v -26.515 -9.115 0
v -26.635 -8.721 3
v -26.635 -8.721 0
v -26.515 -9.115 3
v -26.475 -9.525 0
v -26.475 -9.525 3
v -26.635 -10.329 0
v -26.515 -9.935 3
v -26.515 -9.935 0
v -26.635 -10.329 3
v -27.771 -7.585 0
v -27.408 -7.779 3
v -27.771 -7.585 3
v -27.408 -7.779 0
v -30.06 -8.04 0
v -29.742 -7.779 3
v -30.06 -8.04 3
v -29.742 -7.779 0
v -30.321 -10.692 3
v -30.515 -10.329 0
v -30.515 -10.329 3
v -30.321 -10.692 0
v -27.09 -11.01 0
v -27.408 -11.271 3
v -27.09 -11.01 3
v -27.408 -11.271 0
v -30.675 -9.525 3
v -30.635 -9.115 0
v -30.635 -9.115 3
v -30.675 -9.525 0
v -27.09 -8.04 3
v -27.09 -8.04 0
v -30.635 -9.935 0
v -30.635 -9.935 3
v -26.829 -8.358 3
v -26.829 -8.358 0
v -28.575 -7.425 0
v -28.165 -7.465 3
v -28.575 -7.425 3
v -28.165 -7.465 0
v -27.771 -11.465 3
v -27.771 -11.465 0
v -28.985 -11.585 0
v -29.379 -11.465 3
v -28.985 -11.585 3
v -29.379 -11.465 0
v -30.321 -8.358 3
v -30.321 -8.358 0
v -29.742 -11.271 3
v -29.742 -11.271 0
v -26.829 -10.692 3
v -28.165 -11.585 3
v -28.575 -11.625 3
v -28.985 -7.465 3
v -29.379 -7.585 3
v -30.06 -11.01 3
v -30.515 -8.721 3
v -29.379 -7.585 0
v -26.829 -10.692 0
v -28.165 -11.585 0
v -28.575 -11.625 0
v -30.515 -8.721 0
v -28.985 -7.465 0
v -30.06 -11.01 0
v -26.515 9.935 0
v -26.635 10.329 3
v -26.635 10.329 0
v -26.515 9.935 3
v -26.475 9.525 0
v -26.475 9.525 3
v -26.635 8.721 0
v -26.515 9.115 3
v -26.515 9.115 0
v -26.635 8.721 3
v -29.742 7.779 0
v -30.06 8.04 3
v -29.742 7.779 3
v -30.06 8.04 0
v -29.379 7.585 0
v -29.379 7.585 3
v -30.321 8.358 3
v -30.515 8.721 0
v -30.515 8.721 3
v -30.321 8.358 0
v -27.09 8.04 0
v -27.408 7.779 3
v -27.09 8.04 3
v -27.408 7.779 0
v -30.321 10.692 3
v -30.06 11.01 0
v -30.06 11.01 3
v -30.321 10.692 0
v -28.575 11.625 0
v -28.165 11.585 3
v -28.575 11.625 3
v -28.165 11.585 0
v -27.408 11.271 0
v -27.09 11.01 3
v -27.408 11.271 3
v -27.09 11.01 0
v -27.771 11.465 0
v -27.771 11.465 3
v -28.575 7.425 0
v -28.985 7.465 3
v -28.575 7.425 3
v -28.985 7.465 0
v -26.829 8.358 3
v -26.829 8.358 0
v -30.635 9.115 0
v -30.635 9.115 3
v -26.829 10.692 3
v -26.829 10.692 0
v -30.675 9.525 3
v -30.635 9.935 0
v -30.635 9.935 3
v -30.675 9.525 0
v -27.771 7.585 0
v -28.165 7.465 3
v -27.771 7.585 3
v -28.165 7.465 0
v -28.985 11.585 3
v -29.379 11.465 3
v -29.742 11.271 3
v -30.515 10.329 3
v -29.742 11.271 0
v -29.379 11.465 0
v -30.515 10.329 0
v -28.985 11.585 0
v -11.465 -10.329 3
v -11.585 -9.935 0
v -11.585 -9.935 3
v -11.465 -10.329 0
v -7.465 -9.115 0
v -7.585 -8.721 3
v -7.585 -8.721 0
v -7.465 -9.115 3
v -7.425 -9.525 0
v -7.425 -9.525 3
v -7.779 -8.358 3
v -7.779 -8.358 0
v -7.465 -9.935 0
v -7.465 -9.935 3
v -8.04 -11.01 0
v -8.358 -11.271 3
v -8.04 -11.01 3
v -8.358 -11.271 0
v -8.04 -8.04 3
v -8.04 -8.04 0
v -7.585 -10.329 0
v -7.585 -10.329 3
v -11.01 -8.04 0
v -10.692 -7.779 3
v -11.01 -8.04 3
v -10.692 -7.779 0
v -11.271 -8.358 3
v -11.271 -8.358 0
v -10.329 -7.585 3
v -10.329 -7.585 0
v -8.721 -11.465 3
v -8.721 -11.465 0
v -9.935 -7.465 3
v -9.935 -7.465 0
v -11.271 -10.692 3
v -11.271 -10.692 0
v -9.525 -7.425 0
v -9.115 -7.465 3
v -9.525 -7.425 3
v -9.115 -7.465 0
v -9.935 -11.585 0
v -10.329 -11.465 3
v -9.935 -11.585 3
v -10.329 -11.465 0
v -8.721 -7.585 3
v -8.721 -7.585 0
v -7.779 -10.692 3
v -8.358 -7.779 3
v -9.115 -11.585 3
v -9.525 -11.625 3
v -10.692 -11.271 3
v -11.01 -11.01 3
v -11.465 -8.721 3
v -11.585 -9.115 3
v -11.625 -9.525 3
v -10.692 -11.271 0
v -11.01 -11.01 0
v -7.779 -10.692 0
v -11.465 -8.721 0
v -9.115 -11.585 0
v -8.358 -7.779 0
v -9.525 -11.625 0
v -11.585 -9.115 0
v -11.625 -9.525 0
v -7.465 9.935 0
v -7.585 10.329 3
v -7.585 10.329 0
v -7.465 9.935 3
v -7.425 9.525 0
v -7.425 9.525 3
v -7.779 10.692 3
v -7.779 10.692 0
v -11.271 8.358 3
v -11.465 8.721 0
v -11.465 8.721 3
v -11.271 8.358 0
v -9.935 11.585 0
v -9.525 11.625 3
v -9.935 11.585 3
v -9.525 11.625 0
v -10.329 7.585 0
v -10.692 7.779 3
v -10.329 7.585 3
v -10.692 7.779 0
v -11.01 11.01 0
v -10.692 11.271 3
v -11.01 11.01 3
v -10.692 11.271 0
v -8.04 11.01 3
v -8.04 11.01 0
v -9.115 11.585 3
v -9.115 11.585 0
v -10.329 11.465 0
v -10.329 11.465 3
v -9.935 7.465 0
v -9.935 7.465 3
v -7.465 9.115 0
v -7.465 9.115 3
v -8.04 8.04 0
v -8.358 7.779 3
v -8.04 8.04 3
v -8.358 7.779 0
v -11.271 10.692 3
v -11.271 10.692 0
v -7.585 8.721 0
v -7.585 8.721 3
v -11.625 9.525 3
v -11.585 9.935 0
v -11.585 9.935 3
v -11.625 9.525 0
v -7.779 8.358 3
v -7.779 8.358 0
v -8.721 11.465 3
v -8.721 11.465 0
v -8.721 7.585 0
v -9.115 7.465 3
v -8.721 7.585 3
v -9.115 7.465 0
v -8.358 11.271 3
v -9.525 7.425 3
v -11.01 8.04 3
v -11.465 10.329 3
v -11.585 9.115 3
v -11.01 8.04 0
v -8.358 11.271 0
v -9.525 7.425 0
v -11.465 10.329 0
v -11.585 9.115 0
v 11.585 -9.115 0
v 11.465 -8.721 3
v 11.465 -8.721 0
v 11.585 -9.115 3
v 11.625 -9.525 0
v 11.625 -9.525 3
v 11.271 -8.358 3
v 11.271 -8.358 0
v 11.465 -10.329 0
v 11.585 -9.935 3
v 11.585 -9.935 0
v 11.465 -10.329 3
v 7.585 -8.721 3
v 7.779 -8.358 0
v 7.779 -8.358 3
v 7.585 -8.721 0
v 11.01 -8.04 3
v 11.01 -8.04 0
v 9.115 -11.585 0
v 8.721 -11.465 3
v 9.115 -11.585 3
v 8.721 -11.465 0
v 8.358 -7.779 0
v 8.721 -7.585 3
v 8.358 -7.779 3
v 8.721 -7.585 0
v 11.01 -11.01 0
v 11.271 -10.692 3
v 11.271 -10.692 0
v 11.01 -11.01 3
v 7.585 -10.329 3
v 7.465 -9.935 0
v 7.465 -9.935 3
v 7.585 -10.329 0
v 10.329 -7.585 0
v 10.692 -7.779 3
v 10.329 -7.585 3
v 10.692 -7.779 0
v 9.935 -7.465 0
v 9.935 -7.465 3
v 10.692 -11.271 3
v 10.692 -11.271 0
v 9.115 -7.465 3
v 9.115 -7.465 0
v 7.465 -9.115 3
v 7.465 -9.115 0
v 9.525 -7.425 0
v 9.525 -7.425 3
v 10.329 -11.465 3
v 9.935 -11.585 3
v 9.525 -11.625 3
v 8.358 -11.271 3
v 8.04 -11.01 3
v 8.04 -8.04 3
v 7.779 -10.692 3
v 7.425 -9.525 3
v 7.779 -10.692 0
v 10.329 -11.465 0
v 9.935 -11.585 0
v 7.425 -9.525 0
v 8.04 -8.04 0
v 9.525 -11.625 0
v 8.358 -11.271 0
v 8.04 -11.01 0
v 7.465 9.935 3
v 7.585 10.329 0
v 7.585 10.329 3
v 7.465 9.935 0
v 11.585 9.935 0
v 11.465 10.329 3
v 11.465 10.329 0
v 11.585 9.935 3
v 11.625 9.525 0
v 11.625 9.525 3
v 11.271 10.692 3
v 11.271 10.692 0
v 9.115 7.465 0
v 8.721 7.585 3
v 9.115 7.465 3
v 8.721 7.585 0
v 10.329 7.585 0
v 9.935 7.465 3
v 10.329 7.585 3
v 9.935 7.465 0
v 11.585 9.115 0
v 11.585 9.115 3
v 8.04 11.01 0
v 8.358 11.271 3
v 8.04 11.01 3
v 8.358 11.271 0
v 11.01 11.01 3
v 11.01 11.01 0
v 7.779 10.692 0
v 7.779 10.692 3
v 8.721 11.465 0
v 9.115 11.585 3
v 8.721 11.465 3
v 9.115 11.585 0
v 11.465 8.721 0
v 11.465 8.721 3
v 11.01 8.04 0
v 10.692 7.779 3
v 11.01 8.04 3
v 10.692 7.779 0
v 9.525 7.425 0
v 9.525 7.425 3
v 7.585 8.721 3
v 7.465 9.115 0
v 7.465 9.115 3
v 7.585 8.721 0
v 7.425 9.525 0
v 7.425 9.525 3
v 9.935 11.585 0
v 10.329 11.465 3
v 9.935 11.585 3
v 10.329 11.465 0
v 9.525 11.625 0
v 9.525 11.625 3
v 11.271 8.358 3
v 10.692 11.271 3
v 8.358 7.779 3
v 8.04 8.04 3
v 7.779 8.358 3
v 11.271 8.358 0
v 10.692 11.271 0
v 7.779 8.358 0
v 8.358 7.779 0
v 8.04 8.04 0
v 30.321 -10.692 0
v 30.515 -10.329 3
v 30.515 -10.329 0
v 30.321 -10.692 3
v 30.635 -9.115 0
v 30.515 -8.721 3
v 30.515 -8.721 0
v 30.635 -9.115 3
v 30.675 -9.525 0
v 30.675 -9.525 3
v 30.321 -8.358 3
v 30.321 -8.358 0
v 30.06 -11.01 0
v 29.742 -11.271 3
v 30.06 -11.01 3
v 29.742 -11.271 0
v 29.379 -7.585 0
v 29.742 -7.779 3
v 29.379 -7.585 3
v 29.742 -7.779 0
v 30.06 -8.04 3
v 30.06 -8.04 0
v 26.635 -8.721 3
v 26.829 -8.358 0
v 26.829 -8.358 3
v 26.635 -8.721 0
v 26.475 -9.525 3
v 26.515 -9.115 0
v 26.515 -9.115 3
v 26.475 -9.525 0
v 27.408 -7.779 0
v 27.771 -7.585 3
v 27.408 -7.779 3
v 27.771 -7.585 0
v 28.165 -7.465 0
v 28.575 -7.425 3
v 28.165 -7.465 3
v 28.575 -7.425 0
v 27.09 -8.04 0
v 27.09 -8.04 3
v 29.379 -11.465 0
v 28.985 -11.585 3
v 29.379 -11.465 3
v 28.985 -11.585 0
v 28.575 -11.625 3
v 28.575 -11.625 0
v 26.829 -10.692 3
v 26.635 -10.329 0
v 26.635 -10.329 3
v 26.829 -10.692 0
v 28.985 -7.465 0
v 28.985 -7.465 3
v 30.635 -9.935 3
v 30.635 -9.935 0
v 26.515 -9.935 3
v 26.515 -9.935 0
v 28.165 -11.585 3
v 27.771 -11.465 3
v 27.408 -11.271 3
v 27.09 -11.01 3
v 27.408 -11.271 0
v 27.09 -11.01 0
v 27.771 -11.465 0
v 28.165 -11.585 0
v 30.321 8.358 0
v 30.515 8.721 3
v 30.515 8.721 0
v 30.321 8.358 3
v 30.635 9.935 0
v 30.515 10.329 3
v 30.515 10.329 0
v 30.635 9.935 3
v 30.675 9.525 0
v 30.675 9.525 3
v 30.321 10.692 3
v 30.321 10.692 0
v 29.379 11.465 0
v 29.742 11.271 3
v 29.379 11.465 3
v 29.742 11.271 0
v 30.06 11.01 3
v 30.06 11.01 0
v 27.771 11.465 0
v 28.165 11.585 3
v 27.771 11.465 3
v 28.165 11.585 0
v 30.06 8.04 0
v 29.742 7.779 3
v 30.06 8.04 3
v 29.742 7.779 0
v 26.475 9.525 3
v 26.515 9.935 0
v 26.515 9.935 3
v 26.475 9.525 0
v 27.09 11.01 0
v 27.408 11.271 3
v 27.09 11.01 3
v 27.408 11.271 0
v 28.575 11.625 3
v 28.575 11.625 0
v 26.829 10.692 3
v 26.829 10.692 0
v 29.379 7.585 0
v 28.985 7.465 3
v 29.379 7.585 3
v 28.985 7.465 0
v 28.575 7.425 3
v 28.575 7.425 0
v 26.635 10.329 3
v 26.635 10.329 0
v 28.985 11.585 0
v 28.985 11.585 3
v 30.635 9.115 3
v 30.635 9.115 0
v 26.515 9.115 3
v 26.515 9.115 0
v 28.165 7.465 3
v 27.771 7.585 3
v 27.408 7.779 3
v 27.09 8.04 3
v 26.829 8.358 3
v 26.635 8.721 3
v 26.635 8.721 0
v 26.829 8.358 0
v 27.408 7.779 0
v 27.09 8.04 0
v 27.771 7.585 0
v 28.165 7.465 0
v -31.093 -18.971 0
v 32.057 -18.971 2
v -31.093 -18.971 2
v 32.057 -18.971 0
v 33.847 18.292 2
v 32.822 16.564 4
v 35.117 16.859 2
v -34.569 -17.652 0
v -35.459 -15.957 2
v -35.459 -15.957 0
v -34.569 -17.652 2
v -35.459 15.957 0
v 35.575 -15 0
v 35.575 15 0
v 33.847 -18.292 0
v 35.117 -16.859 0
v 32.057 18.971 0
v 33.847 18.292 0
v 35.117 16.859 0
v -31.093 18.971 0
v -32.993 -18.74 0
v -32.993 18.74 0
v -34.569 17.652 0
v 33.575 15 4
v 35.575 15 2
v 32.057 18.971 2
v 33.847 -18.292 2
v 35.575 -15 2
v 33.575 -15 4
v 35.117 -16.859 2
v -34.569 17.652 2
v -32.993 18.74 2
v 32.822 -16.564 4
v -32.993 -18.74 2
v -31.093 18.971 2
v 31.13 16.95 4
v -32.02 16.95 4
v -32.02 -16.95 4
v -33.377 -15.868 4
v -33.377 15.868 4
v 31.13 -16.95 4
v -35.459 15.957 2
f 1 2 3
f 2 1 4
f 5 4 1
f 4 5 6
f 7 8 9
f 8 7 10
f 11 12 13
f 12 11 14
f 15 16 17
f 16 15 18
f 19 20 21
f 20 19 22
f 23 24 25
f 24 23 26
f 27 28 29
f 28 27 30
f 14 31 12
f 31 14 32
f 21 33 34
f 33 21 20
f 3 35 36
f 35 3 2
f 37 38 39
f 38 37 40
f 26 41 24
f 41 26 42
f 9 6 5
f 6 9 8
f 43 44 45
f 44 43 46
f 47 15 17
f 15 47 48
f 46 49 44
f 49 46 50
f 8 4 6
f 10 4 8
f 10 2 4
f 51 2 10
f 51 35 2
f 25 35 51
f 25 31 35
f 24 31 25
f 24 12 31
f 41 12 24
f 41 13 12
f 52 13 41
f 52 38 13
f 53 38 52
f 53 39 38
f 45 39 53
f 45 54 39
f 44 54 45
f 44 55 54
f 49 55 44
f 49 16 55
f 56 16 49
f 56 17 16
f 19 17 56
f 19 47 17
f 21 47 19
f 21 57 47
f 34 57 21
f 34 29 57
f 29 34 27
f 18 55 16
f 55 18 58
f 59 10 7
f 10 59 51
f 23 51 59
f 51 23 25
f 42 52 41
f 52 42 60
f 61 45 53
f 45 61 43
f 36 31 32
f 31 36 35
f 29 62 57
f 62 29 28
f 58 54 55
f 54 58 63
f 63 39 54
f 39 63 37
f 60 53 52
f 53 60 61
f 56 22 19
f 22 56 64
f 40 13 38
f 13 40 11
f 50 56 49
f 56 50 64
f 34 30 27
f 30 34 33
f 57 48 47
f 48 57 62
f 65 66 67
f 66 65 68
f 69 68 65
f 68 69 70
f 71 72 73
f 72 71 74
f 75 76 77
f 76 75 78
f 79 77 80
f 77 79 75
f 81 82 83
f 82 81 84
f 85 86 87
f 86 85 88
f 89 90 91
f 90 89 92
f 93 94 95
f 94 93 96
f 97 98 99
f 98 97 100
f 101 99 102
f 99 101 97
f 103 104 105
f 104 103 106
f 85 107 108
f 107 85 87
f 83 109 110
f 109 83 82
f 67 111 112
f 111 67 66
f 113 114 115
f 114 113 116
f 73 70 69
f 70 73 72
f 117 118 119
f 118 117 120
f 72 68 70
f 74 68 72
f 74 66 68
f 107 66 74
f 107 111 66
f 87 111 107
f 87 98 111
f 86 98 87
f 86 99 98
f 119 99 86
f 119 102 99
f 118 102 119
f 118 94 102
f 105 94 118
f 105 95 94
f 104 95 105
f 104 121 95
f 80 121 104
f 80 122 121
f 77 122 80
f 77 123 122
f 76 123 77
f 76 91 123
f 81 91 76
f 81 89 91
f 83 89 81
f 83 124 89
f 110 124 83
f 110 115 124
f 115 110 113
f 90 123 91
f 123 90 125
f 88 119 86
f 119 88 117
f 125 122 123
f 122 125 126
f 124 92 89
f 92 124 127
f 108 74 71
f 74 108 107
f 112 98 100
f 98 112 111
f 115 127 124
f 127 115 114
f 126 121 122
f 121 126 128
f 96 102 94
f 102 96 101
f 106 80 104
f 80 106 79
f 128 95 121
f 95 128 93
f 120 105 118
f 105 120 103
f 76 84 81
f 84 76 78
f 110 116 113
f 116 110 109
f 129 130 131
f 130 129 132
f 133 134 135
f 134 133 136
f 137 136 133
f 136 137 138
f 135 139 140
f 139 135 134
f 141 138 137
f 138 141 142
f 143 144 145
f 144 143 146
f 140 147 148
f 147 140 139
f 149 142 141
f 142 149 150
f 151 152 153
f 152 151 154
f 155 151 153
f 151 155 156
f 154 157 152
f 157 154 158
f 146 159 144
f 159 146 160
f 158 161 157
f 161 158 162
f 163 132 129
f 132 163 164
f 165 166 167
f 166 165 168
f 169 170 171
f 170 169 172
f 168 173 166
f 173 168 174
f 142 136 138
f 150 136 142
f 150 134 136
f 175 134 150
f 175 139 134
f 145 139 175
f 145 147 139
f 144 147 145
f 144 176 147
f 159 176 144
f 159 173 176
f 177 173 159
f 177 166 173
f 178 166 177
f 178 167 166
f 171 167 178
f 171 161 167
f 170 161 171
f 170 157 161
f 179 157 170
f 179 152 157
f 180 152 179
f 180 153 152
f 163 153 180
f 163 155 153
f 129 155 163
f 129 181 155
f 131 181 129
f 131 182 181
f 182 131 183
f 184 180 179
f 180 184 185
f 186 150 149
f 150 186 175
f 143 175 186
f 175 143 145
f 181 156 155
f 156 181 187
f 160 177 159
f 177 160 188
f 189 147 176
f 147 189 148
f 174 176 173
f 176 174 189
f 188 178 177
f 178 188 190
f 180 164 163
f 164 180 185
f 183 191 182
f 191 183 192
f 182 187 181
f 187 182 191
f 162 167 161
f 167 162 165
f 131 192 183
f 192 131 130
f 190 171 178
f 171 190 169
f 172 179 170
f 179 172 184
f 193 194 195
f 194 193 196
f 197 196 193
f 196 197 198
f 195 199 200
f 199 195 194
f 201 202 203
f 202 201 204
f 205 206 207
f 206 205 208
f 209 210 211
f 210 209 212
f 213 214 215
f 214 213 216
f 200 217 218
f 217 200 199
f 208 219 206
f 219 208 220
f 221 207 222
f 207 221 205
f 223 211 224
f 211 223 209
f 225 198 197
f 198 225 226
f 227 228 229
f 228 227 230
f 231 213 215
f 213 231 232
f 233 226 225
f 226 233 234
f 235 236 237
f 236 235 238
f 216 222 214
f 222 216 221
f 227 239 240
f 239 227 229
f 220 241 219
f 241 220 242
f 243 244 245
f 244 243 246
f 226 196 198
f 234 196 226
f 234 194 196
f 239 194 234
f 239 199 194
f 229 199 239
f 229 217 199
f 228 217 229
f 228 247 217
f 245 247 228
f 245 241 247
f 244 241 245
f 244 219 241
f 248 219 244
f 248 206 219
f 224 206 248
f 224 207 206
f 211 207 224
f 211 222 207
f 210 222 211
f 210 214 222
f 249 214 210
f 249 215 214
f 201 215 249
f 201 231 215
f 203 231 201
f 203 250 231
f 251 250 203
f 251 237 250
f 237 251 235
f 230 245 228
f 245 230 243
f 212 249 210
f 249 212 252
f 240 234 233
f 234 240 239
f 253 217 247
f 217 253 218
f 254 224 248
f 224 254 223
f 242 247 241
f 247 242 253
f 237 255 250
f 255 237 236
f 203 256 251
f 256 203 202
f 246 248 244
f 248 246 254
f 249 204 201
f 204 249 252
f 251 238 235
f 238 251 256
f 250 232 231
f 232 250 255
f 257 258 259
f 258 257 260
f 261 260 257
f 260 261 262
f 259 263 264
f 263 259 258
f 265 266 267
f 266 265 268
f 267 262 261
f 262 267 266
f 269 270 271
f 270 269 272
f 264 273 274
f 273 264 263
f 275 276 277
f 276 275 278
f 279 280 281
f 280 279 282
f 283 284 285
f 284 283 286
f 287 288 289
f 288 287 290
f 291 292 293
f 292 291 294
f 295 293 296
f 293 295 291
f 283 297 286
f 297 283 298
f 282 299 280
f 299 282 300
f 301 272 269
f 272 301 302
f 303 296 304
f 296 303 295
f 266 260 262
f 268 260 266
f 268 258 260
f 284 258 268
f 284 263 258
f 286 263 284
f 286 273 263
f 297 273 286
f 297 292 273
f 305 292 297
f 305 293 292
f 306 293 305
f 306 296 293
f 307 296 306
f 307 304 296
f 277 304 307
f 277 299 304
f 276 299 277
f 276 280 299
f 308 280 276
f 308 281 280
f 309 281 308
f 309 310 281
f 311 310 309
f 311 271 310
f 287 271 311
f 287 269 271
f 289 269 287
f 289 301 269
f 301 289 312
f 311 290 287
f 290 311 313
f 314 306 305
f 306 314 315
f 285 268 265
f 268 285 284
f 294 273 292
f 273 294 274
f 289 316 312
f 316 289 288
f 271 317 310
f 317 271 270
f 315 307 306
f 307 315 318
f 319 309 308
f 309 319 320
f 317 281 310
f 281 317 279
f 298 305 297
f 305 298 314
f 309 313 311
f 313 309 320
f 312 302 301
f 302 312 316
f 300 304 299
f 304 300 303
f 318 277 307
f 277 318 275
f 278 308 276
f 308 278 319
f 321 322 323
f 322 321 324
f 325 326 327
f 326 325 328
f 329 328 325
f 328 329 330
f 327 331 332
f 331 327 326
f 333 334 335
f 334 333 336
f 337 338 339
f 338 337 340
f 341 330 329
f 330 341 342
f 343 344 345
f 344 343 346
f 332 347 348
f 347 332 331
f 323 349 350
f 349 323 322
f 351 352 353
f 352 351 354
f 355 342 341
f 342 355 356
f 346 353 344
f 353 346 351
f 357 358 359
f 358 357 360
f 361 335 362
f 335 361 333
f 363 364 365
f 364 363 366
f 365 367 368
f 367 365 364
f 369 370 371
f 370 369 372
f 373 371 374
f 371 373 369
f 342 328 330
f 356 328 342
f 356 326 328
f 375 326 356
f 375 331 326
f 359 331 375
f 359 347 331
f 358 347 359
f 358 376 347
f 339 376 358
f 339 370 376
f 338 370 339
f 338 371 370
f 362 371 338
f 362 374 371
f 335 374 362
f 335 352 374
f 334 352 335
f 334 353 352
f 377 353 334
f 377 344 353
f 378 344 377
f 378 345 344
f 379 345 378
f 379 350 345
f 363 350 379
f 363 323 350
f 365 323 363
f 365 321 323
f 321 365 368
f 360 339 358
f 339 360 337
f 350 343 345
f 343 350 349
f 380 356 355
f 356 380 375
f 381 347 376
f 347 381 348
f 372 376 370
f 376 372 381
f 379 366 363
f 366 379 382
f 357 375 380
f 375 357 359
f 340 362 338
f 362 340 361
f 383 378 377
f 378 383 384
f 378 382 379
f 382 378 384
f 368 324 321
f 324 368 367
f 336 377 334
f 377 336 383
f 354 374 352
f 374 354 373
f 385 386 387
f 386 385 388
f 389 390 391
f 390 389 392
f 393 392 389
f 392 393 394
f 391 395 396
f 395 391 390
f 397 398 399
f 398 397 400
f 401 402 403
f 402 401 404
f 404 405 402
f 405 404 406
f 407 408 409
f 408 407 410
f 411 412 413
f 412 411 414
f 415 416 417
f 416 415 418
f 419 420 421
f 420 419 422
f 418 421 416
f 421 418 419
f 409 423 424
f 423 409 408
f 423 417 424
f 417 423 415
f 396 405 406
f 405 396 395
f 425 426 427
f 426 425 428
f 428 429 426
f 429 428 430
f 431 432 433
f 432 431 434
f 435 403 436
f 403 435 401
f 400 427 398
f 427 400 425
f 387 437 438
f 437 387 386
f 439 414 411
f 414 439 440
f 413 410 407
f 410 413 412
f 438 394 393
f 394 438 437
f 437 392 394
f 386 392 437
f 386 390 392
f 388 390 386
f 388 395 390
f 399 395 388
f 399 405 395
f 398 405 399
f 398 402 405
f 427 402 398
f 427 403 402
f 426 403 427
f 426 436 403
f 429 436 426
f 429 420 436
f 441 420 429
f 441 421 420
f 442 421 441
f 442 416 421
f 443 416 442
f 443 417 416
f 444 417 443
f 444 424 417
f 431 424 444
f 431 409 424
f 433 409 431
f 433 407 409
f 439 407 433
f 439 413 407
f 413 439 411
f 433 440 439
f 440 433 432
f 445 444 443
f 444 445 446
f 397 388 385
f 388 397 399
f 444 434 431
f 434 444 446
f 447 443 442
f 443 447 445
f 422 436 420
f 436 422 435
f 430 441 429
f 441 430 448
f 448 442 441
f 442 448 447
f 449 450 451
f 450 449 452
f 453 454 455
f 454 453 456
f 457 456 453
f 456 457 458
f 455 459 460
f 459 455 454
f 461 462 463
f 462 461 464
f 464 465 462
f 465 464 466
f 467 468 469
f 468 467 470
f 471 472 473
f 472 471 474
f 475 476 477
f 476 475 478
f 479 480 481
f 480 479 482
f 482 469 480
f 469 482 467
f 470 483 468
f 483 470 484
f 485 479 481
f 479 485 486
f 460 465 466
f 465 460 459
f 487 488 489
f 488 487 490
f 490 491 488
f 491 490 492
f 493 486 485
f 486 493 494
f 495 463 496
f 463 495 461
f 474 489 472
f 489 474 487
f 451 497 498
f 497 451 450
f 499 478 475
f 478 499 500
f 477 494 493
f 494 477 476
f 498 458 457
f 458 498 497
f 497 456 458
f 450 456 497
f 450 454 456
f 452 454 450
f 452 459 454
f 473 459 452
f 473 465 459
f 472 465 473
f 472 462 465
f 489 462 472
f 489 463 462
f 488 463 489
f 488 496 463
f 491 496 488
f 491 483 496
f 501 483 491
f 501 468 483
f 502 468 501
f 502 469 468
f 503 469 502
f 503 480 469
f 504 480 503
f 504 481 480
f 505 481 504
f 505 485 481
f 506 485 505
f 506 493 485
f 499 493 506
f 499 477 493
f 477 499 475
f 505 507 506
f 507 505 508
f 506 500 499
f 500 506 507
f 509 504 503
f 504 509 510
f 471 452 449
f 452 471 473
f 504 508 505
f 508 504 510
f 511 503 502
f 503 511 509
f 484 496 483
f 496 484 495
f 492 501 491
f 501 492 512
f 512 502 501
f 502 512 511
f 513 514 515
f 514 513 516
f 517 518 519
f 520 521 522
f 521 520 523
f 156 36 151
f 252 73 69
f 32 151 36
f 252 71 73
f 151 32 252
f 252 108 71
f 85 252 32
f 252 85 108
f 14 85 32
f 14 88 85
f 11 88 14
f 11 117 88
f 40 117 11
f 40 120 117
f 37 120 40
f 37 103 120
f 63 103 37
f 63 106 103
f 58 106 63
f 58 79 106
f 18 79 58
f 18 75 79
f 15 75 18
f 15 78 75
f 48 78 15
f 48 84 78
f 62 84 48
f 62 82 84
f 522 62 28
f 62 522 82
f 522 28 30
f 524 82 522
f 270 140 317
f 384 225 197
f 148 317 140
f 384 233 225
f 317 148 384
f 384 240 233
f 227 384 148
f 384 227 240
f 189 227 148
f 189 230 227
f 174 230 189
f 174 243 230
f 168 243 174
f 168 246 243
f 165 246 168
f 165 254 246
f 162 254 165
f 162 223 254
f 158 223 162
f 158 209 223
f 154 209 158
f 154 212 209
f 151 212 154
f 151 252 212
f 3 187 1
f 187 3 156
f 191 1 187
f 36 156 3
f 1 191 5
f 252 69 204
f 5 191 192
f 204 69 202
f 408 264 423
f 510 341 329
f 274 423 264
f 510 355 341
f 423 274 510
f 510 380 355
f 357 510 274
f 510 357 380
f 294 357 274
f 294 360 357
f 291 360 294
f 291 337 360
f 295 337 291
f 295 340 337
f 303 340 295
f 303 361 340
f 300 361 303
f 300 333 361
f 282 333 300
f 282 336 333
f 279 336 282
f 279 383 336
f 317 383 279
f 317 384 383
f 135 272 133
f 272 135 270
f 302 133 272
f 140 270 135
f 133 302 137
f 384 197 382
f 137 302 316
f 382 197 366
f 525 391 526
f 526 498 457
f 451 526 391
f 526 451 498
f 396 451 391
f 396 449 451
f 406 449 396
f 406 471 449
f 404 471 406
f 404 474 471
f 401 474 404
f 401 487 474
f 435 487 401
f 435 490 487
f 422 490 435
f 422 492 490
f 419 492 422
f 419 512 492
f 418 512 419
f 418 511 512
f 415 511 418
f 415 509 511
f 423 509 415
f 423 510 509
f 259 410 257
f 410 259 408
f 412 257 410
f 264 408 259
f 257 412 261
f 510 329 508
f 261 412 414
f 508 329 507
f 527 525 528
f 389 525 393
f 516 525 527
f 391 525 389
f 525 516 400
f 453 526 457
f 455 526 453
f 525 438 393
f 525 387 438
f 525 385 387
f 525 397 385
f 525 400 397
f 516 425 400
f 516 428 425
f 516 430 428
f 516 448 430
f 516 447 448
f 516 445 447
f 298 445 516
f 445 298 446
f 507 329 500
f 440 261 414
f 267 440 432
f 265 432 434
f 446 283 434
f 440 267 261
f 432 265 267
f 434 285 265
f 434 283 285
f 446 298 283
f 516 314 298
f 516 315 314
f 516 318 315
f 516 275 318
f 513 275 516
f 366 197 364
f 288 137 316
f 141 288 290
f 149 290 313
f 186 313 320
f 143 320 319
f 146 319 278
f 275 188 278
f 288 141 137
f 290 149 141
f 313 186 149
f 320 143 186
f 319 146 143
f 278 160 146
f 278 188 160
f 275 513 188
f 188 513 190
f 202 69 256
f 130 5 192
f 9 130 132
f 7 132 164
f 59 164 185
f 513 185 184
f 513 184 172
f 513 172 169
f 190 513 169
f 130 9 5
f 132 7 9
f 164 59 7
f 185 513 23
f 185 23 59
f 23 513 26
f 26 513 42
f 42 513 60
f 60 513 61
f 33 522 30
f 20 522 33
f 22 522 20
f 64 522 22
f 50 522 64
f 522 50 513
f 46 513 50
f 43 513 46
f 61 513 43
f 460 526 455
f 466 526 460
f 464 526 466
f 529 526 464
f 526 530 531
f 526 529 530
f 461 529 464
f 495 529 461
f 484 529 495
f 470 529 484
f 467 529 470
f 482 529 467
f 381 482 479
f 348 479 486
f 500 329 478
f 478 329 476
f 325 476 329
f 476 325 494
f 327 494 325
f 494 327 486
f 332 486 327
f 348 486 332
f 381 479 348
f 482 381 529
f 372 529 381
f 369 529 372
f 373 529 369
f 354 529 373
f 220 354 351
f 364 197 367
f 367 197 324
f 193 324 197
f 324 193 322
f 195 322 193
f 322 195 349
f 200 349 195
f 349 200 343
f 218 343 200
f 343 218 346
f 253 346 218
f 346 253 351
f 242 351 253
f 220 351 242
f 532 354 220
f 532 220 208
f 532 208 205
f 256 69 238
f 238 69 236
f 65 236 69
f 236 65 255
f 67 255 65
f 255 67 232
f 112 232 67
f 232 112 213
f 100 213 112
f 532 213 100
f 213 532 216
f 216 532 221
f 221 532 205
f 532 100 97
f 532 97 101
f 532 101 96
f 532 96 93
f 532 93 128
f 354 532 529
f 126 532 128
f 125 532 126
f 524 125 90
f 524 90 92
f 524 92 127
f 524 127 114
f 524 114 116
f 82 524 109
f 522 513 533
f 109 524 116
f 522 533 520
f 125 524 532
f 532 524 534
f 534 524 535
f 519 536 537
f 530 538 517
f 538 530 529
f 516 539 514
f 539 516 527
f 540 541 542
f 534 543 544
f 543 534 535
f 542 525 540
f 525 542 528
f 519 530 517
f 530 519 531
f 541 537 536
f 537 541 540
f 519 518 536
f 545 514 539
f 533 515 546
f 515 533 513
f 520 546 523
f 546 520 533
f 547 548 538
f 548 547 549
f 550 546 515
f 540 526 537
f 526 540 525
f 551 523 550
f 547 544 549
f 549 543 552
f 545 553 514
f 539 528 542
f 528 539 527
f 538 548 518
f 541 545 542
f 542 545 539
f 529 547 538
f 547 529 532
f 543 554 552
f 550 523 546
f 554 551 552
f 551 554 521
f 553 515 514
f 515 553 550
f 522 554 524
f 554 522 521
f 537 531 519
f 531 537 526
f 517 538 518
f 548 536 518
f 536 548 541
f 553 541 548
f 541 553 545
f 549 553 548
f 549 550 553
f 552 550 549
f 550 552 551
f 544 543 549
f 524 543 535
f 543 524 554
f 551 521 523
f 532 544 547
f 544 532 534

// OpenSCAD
// file: ../lib/common.scad
// Copyright (c) 2026 mmmaxwwwell
// Licensed under CC BY-NC-ND 4.0, https://creativecommons.org/licenses/by-nc-nd/4.0/
// Free for personal use. Commercial use requires a separate license.
//
// Kanix Common Parameters
// Shared constants Kanix belt clip mounting.
// 3x3 grid of holes, 3/4" (19.05mm) spacing, M5 self-tapping screws.

// ===== Kanix Mounting Constants =====
kanix_hole_spacing = 19.05; // mm between adjacent holes (3/4")
kanix_screw_d      = 4.2;   // mm pilot hole for M5 self-tap

// ===== Default Plate Parameters =====
// Override these after include if your design needs different values.
plate_margin   = 7;   // mm margin around outermost holes
plate_corner_r = 4;   // mm corner radius
plate_edge_r   = 2;   // mm top edge rounding radius

// ===== Helper Functions =====

// Plate dimension for a given grid size and margin.
// Returns the width or height of a square plate that fits the hole grid.
function kanix_plate_dim(grid_size, margin = plate_margin) =
    kanix_hole_spacing * (grid_size - 1) + margin * 2;

// Grid offset: centers a grid_size x grid_size pattern around the origin.
function kanix_grid_offset(grid_size) =
    (grid_size - 1) / 2;
// file: ../lib/mounting-plate.scad
// Copyright (c) 2026 mmmaxwwwell
// Licensed under CC BY-NC-ND 4.0, https://creativecommons.org/licenses/by-nc-nd/4.0/
// Free for personal use. Commercial use requires a separate license.
//
// Kanix Mounting Plate
//
// The flat back plate that accessories use to bolt onto a Kanix belt clip.
// Geometry: rounded rectangle with a rounded top edge, drilled from the
// bottom face with a blind bolt-shaft clearance grid that does NOT break
// through the top face. No counterbore — just the shaft.
//
// Bottom face (Z=0) is the clip-side: bolts come up from the clip into the
// plate. Top face stays unbroken — better cosmetics and prints flat without
// bridging over hole tops.
//
// Usage:
//   include <lib/presets.scad>
//   use <lib/mounting-plate.scad>
//   mounting_plate(kanix_grid_3x2);

include <common.scad>
include <presets.scad>

// Default plate thickness for accessory back-plates. Accessories don't carry
// a belt preset, so they can't read plate_thickness from one. Override per
// accessory if you need more bolt-bite depth.
mounting_plate_default_thickness = 4;
mounting_plate_default_screw_depth = 3;

// Render a back plate sized + drilled for the given grid preset.
//
// grid              — a kanix_grid_* bundle from lib/presets.scad
// thickness         — plate thickness in mm (default: 4)
// corner_r          — XY corner radius (default: common.scad's plate_corner_r)
// edge_r            — top-edge fillet radius (default: common.scad's plate_edge_r)
// screw_hole_depth  — blind drill depth measured from the bottom face up
//                     (default: 3mm). Must be < thickness.
// drill_holes       — set false to omit the bolt grid
// hole_cols/rows    — override the grid's cols/rows to render a partial plate
//                     (e.g. a 1-row strip cut from a 3x3 grid). When set,
//                     plate width/height scale proportionally.
// cutout            — when true, output ONLY the bolt-hole cylinders (no
//                     body). Use this inside a parent difference() when the
//                     plate body has been replaced or reshaped (e.g. after
//                     a hull) and you still want the original bolt pattern
//                     punched through.
module mounting_plate(
    grid,
    thickness         = undef,
    corner_r          = undef,
    edge_r            = undef,
    screw_hole_depth  = undef,
    drill_holes       = true,
    hole_cols         = undef,
    hole_rows         = undef,
    cutout            = false
) {
    t          = thickness == undef ? mounting_plate_default_thickness : thickness;
    cr         = corner_r  == undef ? plate_corner_r : corner_r;
    er         = edge_r    == undef ? plate_edge_r   : edge_r;
    hole_dep   = screw_hole_depth == undef ? mounting_plate_default_screw_depth : screw_hole_depth;

    // Partial-plate slicing: caller can render a subset of the grid by passing
    // hole_cols/hole_rows < the grid's own counts. Plate w/h scale linearly
    // off the grid's full footprint so the "slice" footprint matches.
    full_cols  = preset_get(grid, "hole_cols");
    full_rows  = preset_get(grid, "hole_rows");
    cols       = hole_cols == undef ? full_cols : hole_cols;
    rows       = hole_rows == undef ? full_rows : hole_rows;
    full_w     = preset_get(grid, "plate_w");
    full_h     = preset_get(grid, "plate_h");
    w          = full_w * cols / full_cols;
    h          = full_h * rows / full_rows;

    assert(hole_dep < t,
        "screw_hole_depth must be < plate thickness (holes are blind)");

    if (cutout) {
        plate_holes(grid, t + 0.2, cols, rows);
    } else {
        difference() {
            plate_body(w, h, t, cr, er);
            if (drill_holes) plate_holes(grid, hole_dep, cols, rows);
        }
    }
}

// Plate body: rounded rectangle with a rounded top edge. Bottom face is flat
// (sits on the build plate); top face is filleted by edge_r.
module plate_body(w, h, t, cr, er) {
    hull() {
        for (x = [-w/2 + cr, w/2 - cr])
            for (y = [-h/2 + cr, h/2 - cr])
                translate([x, y, 0])
                    cylinder(r = cr, h = t - er);
        for (x = [-w/2 + cr, w/2 - cr])
            for (y = [-h/2 + cr, h/2 - cr])
                translate([x, y, t - er]) {
                    cylinder(r = cr - er, h = er);
                    sphere(r = er);
                }
    }
}

// Bolt grid: blind shaft-clearance hole drilled from the bottom face up to
// `hole_dep`. No counterbore — just the shaft. Pattern centered on origin.
module plate_holes(grid, hole_dep, cols, rows) {
    spacing    = preset_get(grid, "hole_spacing");
    pilot_d    = preset_get(grid, "pilot_hole_d");
    col_offset = (cols - 1) / 2;
    row_offset = (rows - 1) / 2;

    for (col = [0 : cols - 1])
        for (row = [0 : rows - 1])
            translate([
                (col - col_offset) * spacing,
                (row - row_offset) * spacing,
                -0.1
            ])
                cylinder(d = pilot_d, h = hole_dep + 0.1, $fn = 32);
}
// file: ../lib/presets.scad
// Copyright (c) 2026 mmmaxwwwell
// Licensed under CC BY-NC-ND 4.0, https://creativecommons.org/licenses/by-nc-nd/4.0/
// Free for personal use. Commercial use requires a separate license.
//
// Kanix Presets — grids and belts
//
// Two preset families:
//
//   kanix_grid_<cols>x<rows>   — bolt pattern + plate footprint. Everything an
//                                accessory needs to bolt onto a Kanix plate.
//                                Rows imply belt height: 2 rows = 38mm/1.5"
//                                belt, 3 rows = 52mm/2" belt.
//
//   kanix_belt_<h>x<t>         — belt-only fields (height, thickness, plate
//                                thickness, screw length). Consumed by the
//                                kanix_plate clip module. Accessories ignore.
//
// A render fixture for the clip combines the two:
//   kanix_plate(kanix_grid_3x2, kanix_belt_38x4);
//
// A render fixture for an accessory only needs the grid:
//   clicker_holder(kanix_grid_3x2);
//
// Look up fields with preset_get(p, "key"). Misspell a key → undef → loud
// failure on first numeric op. Do not paper over with default fallbacks.

include <common.scad>

// ============================================================================
// GRID PRESETS — bolt pattern + plate footprint (what accessories see)
// ============================================================================
//
// Field reference:
//   name          short id for fixtures
//   hole_cols     bolt columns (across the belt)
//   hole_rows     bolt rows   (up the belt) — 2 = 38mm belt, 3 = 52mm belt
//   hole_spacing  mm between adjacent holes (always kanix_hole_spacing)
//   plate_w       plate width  in mm (across the belt)
//   plate_h       plate height in mm (up the belt)   — matches belt height
//   pilot_hole_d  M5 self-tap pilot
//
// Plate footprint rule of thumb: plate_h matches the belt height (38 or 52).
// plate_w = hole_spacing*(cols-1) + 2*margin, where margin is chosen per grid
// to give a clean edge-to-hole distance.

// ----- 38mm belt (1.5" duty), 2 rows -----
kanix_grid_2x2 = [
    ["name",          "2x2"],
    ["hole_cols",      2],
    ["hole_rows",      2],
    ["hole_spacing",   kanix_hole_spacing],
    ["plate_w",        38],
    ["plate_h",        38],
    ["pilot_hole_d",   kanix_screw_d]
];

kanix_grid_3x2 = [
    ["name",          "3x2"],
    ["hole_cols",      3],
    ["hole_rows",      2],
    ["hole_spacing",   kanix_hole_spacing],
    ["plate_w",        kanix_hole_spacing * 2 + 14],   // 57.1
    ["plate_h",        38],
    ["pilot_hole_d",   kanix_screw_d]
];

kanix_grid_4x2 = [
    ["name",          "4x2"],
    ["hole_cols",      4],
    ["hole_rows",      2],
    ["hole_spacing",   kanix_hole_spacing],
    ["plate_w",        kanix_hole_spacing * 3 + 14],   // 76.15
    ["plate_h",        38],
    ["pilot_hole_d",   kanix_screw_d]
];

// ----- 52mm belt (2" duty), 3 rows -----
kanix_grid_3x3 = [
    ["name",          "3x3"],
    ["hole_cols",      3],
    ["hole_rows",      3],
    ["hole_spacing",   kanix_hole_spacing],
    ["plate_w",        52],
    ["plate_h",        52],
    ["pilot_hole_d",   kanix_screw_d]
];

kanix_grid_4x3 = [
    ["name",          "4x3"],
    ["hole_cols",      4],
    ["hole_rows",      3],
    ["hole_spacing",   kanix_hole_spacing],
    ["plate_w",        kanix_hole_spacing * 3 + 14],   // 76.15
    ["plate_h",        52],
    ["pilot_hole_d",   kanix_screw_d]
];

// ============================================================================
// BELT PRESETS — clip-only (height, thickness, plate thickness, screw length)
// ============================================================================
//
// Field reference:
//   name             short id for fixtures
//   belt_height      mm; informational — matches the grid's plate_h
//   belt_thickness   mm; gap the clip wraps around the belt
//   plate_thickness  mm; thickness of the back plate (where bolts go)
//   screw_length     mm; max bite depth into plate (plate_thickness - 1mm)

// ----- 38mm / 1.5" duty belts -----
kanix_belt_38x4 = [
    ["name",            "38x4"],
    ["belt_height",     38],
    ["belt_thickness",  4],
    ["plate_thickness", 4],
    ["screw_length",    3]
];

kanix_belt_38x5_3 = [
    ["name",            "38x5.3"],
    ["belt_height",     38],
    ["belt_thickness",  5.3],
    ["plate_thickness", 4],
    ["screw_length",    3]
];

// ----- 52mm / 2" duty belts -----
kanix_belt_52x6_5 = [
    ["name",            "52x6.5"],
    ["belt_height",     52],
    ["belt_thickness",  6.5],
    ["plate_thickness", 5.5],
    ["screw_length",    5]
];

kanix_belt_52x12 = [
    ["name",            "52x12"],
    ["belt_height",     52],
    ["belt_thickness",  12],
    ["plate_thickness", 5.5],
    ["screw_length",    5]
];

// ============================================================================
// Legacy combined presets — DEPRECATED, do not use in new code
// ============================================================================
// These flatten a grid + belt into one bundle so existing accessory files
// (clicker_holder_*.scad, wuben-c3-holster.scad, etc.) keep rendering until
// they're migrated to take just a grid preset. New accessories should take
// kanix_grid_* directly; new plates use kanix_grid_* + kanix_belt_*.

kanix_preset_38x4 = [
    ["name",            "38x4"],
    ["plate_size",      38],
    ["plate_thickness", 4],
    ["belt_thickness",  4],
    ["belt_height",     51],
    ["hole_cols",       2],
    ["hole_rows",       2],
    ["hole_spacing",    kanix_hole_spacing],
    ["plate_w",         38],
    ["plate_h",         38],
    ["pilot_hole_d",    kanix_screw_d],
    ["screw_length",    3]
];

kanix_preset_52x65 = [
    ["name",            "52x6_5"],
    ["plate_size",      52],
    ["plate_thickness", 5.5],
    ["belt_thickness",  6.5],
    ["belt_height",     51],
    ["hole_cols",       3],
    ["hole_rows",       3],
    ["hole_spacing",    kanix_hole_spacing],
    ["plate_w",         52],
    ["plate_h",         52],
    ["pilot_hole_d",    kanix_screw_d],
    ["screw_length",    5]
];

// ============================================================================
// Accessor
// ============================================================================
// Look up a field by key. Errors loudly (undef) if the key is absent so a
// typo surfaces immediately instead of silently using a default.
function preset_get(preset, key) =
    let (hits = [for (kv = preset) if (kv[0] == key) kv[1]])
    hits[0];
// main file
// Copyright (c) 2026 mmmaxwwwell
// Licensed under CC BY-NC-ND 4.0, https://creativecommons.org/licenses/by-nc-nd/4.0/
// Free for personal use. Commercial use requires a separate license.
//
// Render fixture: Kanix clip — 4x2 grid, 38mm belt height, 5.3mm belt thickness.
//
// TODO: kanix-plate.scad currently only supports square plates. Placeholder
// renders the back plate only. Switch to kanix_plate_from_presets after the
// rectangular-plate rewrite.

include <../lib/presets.scad>
use <../lib/mounting-plate.scad>

mounting_plate(kanix_grid_4x2, thickness = 4);
